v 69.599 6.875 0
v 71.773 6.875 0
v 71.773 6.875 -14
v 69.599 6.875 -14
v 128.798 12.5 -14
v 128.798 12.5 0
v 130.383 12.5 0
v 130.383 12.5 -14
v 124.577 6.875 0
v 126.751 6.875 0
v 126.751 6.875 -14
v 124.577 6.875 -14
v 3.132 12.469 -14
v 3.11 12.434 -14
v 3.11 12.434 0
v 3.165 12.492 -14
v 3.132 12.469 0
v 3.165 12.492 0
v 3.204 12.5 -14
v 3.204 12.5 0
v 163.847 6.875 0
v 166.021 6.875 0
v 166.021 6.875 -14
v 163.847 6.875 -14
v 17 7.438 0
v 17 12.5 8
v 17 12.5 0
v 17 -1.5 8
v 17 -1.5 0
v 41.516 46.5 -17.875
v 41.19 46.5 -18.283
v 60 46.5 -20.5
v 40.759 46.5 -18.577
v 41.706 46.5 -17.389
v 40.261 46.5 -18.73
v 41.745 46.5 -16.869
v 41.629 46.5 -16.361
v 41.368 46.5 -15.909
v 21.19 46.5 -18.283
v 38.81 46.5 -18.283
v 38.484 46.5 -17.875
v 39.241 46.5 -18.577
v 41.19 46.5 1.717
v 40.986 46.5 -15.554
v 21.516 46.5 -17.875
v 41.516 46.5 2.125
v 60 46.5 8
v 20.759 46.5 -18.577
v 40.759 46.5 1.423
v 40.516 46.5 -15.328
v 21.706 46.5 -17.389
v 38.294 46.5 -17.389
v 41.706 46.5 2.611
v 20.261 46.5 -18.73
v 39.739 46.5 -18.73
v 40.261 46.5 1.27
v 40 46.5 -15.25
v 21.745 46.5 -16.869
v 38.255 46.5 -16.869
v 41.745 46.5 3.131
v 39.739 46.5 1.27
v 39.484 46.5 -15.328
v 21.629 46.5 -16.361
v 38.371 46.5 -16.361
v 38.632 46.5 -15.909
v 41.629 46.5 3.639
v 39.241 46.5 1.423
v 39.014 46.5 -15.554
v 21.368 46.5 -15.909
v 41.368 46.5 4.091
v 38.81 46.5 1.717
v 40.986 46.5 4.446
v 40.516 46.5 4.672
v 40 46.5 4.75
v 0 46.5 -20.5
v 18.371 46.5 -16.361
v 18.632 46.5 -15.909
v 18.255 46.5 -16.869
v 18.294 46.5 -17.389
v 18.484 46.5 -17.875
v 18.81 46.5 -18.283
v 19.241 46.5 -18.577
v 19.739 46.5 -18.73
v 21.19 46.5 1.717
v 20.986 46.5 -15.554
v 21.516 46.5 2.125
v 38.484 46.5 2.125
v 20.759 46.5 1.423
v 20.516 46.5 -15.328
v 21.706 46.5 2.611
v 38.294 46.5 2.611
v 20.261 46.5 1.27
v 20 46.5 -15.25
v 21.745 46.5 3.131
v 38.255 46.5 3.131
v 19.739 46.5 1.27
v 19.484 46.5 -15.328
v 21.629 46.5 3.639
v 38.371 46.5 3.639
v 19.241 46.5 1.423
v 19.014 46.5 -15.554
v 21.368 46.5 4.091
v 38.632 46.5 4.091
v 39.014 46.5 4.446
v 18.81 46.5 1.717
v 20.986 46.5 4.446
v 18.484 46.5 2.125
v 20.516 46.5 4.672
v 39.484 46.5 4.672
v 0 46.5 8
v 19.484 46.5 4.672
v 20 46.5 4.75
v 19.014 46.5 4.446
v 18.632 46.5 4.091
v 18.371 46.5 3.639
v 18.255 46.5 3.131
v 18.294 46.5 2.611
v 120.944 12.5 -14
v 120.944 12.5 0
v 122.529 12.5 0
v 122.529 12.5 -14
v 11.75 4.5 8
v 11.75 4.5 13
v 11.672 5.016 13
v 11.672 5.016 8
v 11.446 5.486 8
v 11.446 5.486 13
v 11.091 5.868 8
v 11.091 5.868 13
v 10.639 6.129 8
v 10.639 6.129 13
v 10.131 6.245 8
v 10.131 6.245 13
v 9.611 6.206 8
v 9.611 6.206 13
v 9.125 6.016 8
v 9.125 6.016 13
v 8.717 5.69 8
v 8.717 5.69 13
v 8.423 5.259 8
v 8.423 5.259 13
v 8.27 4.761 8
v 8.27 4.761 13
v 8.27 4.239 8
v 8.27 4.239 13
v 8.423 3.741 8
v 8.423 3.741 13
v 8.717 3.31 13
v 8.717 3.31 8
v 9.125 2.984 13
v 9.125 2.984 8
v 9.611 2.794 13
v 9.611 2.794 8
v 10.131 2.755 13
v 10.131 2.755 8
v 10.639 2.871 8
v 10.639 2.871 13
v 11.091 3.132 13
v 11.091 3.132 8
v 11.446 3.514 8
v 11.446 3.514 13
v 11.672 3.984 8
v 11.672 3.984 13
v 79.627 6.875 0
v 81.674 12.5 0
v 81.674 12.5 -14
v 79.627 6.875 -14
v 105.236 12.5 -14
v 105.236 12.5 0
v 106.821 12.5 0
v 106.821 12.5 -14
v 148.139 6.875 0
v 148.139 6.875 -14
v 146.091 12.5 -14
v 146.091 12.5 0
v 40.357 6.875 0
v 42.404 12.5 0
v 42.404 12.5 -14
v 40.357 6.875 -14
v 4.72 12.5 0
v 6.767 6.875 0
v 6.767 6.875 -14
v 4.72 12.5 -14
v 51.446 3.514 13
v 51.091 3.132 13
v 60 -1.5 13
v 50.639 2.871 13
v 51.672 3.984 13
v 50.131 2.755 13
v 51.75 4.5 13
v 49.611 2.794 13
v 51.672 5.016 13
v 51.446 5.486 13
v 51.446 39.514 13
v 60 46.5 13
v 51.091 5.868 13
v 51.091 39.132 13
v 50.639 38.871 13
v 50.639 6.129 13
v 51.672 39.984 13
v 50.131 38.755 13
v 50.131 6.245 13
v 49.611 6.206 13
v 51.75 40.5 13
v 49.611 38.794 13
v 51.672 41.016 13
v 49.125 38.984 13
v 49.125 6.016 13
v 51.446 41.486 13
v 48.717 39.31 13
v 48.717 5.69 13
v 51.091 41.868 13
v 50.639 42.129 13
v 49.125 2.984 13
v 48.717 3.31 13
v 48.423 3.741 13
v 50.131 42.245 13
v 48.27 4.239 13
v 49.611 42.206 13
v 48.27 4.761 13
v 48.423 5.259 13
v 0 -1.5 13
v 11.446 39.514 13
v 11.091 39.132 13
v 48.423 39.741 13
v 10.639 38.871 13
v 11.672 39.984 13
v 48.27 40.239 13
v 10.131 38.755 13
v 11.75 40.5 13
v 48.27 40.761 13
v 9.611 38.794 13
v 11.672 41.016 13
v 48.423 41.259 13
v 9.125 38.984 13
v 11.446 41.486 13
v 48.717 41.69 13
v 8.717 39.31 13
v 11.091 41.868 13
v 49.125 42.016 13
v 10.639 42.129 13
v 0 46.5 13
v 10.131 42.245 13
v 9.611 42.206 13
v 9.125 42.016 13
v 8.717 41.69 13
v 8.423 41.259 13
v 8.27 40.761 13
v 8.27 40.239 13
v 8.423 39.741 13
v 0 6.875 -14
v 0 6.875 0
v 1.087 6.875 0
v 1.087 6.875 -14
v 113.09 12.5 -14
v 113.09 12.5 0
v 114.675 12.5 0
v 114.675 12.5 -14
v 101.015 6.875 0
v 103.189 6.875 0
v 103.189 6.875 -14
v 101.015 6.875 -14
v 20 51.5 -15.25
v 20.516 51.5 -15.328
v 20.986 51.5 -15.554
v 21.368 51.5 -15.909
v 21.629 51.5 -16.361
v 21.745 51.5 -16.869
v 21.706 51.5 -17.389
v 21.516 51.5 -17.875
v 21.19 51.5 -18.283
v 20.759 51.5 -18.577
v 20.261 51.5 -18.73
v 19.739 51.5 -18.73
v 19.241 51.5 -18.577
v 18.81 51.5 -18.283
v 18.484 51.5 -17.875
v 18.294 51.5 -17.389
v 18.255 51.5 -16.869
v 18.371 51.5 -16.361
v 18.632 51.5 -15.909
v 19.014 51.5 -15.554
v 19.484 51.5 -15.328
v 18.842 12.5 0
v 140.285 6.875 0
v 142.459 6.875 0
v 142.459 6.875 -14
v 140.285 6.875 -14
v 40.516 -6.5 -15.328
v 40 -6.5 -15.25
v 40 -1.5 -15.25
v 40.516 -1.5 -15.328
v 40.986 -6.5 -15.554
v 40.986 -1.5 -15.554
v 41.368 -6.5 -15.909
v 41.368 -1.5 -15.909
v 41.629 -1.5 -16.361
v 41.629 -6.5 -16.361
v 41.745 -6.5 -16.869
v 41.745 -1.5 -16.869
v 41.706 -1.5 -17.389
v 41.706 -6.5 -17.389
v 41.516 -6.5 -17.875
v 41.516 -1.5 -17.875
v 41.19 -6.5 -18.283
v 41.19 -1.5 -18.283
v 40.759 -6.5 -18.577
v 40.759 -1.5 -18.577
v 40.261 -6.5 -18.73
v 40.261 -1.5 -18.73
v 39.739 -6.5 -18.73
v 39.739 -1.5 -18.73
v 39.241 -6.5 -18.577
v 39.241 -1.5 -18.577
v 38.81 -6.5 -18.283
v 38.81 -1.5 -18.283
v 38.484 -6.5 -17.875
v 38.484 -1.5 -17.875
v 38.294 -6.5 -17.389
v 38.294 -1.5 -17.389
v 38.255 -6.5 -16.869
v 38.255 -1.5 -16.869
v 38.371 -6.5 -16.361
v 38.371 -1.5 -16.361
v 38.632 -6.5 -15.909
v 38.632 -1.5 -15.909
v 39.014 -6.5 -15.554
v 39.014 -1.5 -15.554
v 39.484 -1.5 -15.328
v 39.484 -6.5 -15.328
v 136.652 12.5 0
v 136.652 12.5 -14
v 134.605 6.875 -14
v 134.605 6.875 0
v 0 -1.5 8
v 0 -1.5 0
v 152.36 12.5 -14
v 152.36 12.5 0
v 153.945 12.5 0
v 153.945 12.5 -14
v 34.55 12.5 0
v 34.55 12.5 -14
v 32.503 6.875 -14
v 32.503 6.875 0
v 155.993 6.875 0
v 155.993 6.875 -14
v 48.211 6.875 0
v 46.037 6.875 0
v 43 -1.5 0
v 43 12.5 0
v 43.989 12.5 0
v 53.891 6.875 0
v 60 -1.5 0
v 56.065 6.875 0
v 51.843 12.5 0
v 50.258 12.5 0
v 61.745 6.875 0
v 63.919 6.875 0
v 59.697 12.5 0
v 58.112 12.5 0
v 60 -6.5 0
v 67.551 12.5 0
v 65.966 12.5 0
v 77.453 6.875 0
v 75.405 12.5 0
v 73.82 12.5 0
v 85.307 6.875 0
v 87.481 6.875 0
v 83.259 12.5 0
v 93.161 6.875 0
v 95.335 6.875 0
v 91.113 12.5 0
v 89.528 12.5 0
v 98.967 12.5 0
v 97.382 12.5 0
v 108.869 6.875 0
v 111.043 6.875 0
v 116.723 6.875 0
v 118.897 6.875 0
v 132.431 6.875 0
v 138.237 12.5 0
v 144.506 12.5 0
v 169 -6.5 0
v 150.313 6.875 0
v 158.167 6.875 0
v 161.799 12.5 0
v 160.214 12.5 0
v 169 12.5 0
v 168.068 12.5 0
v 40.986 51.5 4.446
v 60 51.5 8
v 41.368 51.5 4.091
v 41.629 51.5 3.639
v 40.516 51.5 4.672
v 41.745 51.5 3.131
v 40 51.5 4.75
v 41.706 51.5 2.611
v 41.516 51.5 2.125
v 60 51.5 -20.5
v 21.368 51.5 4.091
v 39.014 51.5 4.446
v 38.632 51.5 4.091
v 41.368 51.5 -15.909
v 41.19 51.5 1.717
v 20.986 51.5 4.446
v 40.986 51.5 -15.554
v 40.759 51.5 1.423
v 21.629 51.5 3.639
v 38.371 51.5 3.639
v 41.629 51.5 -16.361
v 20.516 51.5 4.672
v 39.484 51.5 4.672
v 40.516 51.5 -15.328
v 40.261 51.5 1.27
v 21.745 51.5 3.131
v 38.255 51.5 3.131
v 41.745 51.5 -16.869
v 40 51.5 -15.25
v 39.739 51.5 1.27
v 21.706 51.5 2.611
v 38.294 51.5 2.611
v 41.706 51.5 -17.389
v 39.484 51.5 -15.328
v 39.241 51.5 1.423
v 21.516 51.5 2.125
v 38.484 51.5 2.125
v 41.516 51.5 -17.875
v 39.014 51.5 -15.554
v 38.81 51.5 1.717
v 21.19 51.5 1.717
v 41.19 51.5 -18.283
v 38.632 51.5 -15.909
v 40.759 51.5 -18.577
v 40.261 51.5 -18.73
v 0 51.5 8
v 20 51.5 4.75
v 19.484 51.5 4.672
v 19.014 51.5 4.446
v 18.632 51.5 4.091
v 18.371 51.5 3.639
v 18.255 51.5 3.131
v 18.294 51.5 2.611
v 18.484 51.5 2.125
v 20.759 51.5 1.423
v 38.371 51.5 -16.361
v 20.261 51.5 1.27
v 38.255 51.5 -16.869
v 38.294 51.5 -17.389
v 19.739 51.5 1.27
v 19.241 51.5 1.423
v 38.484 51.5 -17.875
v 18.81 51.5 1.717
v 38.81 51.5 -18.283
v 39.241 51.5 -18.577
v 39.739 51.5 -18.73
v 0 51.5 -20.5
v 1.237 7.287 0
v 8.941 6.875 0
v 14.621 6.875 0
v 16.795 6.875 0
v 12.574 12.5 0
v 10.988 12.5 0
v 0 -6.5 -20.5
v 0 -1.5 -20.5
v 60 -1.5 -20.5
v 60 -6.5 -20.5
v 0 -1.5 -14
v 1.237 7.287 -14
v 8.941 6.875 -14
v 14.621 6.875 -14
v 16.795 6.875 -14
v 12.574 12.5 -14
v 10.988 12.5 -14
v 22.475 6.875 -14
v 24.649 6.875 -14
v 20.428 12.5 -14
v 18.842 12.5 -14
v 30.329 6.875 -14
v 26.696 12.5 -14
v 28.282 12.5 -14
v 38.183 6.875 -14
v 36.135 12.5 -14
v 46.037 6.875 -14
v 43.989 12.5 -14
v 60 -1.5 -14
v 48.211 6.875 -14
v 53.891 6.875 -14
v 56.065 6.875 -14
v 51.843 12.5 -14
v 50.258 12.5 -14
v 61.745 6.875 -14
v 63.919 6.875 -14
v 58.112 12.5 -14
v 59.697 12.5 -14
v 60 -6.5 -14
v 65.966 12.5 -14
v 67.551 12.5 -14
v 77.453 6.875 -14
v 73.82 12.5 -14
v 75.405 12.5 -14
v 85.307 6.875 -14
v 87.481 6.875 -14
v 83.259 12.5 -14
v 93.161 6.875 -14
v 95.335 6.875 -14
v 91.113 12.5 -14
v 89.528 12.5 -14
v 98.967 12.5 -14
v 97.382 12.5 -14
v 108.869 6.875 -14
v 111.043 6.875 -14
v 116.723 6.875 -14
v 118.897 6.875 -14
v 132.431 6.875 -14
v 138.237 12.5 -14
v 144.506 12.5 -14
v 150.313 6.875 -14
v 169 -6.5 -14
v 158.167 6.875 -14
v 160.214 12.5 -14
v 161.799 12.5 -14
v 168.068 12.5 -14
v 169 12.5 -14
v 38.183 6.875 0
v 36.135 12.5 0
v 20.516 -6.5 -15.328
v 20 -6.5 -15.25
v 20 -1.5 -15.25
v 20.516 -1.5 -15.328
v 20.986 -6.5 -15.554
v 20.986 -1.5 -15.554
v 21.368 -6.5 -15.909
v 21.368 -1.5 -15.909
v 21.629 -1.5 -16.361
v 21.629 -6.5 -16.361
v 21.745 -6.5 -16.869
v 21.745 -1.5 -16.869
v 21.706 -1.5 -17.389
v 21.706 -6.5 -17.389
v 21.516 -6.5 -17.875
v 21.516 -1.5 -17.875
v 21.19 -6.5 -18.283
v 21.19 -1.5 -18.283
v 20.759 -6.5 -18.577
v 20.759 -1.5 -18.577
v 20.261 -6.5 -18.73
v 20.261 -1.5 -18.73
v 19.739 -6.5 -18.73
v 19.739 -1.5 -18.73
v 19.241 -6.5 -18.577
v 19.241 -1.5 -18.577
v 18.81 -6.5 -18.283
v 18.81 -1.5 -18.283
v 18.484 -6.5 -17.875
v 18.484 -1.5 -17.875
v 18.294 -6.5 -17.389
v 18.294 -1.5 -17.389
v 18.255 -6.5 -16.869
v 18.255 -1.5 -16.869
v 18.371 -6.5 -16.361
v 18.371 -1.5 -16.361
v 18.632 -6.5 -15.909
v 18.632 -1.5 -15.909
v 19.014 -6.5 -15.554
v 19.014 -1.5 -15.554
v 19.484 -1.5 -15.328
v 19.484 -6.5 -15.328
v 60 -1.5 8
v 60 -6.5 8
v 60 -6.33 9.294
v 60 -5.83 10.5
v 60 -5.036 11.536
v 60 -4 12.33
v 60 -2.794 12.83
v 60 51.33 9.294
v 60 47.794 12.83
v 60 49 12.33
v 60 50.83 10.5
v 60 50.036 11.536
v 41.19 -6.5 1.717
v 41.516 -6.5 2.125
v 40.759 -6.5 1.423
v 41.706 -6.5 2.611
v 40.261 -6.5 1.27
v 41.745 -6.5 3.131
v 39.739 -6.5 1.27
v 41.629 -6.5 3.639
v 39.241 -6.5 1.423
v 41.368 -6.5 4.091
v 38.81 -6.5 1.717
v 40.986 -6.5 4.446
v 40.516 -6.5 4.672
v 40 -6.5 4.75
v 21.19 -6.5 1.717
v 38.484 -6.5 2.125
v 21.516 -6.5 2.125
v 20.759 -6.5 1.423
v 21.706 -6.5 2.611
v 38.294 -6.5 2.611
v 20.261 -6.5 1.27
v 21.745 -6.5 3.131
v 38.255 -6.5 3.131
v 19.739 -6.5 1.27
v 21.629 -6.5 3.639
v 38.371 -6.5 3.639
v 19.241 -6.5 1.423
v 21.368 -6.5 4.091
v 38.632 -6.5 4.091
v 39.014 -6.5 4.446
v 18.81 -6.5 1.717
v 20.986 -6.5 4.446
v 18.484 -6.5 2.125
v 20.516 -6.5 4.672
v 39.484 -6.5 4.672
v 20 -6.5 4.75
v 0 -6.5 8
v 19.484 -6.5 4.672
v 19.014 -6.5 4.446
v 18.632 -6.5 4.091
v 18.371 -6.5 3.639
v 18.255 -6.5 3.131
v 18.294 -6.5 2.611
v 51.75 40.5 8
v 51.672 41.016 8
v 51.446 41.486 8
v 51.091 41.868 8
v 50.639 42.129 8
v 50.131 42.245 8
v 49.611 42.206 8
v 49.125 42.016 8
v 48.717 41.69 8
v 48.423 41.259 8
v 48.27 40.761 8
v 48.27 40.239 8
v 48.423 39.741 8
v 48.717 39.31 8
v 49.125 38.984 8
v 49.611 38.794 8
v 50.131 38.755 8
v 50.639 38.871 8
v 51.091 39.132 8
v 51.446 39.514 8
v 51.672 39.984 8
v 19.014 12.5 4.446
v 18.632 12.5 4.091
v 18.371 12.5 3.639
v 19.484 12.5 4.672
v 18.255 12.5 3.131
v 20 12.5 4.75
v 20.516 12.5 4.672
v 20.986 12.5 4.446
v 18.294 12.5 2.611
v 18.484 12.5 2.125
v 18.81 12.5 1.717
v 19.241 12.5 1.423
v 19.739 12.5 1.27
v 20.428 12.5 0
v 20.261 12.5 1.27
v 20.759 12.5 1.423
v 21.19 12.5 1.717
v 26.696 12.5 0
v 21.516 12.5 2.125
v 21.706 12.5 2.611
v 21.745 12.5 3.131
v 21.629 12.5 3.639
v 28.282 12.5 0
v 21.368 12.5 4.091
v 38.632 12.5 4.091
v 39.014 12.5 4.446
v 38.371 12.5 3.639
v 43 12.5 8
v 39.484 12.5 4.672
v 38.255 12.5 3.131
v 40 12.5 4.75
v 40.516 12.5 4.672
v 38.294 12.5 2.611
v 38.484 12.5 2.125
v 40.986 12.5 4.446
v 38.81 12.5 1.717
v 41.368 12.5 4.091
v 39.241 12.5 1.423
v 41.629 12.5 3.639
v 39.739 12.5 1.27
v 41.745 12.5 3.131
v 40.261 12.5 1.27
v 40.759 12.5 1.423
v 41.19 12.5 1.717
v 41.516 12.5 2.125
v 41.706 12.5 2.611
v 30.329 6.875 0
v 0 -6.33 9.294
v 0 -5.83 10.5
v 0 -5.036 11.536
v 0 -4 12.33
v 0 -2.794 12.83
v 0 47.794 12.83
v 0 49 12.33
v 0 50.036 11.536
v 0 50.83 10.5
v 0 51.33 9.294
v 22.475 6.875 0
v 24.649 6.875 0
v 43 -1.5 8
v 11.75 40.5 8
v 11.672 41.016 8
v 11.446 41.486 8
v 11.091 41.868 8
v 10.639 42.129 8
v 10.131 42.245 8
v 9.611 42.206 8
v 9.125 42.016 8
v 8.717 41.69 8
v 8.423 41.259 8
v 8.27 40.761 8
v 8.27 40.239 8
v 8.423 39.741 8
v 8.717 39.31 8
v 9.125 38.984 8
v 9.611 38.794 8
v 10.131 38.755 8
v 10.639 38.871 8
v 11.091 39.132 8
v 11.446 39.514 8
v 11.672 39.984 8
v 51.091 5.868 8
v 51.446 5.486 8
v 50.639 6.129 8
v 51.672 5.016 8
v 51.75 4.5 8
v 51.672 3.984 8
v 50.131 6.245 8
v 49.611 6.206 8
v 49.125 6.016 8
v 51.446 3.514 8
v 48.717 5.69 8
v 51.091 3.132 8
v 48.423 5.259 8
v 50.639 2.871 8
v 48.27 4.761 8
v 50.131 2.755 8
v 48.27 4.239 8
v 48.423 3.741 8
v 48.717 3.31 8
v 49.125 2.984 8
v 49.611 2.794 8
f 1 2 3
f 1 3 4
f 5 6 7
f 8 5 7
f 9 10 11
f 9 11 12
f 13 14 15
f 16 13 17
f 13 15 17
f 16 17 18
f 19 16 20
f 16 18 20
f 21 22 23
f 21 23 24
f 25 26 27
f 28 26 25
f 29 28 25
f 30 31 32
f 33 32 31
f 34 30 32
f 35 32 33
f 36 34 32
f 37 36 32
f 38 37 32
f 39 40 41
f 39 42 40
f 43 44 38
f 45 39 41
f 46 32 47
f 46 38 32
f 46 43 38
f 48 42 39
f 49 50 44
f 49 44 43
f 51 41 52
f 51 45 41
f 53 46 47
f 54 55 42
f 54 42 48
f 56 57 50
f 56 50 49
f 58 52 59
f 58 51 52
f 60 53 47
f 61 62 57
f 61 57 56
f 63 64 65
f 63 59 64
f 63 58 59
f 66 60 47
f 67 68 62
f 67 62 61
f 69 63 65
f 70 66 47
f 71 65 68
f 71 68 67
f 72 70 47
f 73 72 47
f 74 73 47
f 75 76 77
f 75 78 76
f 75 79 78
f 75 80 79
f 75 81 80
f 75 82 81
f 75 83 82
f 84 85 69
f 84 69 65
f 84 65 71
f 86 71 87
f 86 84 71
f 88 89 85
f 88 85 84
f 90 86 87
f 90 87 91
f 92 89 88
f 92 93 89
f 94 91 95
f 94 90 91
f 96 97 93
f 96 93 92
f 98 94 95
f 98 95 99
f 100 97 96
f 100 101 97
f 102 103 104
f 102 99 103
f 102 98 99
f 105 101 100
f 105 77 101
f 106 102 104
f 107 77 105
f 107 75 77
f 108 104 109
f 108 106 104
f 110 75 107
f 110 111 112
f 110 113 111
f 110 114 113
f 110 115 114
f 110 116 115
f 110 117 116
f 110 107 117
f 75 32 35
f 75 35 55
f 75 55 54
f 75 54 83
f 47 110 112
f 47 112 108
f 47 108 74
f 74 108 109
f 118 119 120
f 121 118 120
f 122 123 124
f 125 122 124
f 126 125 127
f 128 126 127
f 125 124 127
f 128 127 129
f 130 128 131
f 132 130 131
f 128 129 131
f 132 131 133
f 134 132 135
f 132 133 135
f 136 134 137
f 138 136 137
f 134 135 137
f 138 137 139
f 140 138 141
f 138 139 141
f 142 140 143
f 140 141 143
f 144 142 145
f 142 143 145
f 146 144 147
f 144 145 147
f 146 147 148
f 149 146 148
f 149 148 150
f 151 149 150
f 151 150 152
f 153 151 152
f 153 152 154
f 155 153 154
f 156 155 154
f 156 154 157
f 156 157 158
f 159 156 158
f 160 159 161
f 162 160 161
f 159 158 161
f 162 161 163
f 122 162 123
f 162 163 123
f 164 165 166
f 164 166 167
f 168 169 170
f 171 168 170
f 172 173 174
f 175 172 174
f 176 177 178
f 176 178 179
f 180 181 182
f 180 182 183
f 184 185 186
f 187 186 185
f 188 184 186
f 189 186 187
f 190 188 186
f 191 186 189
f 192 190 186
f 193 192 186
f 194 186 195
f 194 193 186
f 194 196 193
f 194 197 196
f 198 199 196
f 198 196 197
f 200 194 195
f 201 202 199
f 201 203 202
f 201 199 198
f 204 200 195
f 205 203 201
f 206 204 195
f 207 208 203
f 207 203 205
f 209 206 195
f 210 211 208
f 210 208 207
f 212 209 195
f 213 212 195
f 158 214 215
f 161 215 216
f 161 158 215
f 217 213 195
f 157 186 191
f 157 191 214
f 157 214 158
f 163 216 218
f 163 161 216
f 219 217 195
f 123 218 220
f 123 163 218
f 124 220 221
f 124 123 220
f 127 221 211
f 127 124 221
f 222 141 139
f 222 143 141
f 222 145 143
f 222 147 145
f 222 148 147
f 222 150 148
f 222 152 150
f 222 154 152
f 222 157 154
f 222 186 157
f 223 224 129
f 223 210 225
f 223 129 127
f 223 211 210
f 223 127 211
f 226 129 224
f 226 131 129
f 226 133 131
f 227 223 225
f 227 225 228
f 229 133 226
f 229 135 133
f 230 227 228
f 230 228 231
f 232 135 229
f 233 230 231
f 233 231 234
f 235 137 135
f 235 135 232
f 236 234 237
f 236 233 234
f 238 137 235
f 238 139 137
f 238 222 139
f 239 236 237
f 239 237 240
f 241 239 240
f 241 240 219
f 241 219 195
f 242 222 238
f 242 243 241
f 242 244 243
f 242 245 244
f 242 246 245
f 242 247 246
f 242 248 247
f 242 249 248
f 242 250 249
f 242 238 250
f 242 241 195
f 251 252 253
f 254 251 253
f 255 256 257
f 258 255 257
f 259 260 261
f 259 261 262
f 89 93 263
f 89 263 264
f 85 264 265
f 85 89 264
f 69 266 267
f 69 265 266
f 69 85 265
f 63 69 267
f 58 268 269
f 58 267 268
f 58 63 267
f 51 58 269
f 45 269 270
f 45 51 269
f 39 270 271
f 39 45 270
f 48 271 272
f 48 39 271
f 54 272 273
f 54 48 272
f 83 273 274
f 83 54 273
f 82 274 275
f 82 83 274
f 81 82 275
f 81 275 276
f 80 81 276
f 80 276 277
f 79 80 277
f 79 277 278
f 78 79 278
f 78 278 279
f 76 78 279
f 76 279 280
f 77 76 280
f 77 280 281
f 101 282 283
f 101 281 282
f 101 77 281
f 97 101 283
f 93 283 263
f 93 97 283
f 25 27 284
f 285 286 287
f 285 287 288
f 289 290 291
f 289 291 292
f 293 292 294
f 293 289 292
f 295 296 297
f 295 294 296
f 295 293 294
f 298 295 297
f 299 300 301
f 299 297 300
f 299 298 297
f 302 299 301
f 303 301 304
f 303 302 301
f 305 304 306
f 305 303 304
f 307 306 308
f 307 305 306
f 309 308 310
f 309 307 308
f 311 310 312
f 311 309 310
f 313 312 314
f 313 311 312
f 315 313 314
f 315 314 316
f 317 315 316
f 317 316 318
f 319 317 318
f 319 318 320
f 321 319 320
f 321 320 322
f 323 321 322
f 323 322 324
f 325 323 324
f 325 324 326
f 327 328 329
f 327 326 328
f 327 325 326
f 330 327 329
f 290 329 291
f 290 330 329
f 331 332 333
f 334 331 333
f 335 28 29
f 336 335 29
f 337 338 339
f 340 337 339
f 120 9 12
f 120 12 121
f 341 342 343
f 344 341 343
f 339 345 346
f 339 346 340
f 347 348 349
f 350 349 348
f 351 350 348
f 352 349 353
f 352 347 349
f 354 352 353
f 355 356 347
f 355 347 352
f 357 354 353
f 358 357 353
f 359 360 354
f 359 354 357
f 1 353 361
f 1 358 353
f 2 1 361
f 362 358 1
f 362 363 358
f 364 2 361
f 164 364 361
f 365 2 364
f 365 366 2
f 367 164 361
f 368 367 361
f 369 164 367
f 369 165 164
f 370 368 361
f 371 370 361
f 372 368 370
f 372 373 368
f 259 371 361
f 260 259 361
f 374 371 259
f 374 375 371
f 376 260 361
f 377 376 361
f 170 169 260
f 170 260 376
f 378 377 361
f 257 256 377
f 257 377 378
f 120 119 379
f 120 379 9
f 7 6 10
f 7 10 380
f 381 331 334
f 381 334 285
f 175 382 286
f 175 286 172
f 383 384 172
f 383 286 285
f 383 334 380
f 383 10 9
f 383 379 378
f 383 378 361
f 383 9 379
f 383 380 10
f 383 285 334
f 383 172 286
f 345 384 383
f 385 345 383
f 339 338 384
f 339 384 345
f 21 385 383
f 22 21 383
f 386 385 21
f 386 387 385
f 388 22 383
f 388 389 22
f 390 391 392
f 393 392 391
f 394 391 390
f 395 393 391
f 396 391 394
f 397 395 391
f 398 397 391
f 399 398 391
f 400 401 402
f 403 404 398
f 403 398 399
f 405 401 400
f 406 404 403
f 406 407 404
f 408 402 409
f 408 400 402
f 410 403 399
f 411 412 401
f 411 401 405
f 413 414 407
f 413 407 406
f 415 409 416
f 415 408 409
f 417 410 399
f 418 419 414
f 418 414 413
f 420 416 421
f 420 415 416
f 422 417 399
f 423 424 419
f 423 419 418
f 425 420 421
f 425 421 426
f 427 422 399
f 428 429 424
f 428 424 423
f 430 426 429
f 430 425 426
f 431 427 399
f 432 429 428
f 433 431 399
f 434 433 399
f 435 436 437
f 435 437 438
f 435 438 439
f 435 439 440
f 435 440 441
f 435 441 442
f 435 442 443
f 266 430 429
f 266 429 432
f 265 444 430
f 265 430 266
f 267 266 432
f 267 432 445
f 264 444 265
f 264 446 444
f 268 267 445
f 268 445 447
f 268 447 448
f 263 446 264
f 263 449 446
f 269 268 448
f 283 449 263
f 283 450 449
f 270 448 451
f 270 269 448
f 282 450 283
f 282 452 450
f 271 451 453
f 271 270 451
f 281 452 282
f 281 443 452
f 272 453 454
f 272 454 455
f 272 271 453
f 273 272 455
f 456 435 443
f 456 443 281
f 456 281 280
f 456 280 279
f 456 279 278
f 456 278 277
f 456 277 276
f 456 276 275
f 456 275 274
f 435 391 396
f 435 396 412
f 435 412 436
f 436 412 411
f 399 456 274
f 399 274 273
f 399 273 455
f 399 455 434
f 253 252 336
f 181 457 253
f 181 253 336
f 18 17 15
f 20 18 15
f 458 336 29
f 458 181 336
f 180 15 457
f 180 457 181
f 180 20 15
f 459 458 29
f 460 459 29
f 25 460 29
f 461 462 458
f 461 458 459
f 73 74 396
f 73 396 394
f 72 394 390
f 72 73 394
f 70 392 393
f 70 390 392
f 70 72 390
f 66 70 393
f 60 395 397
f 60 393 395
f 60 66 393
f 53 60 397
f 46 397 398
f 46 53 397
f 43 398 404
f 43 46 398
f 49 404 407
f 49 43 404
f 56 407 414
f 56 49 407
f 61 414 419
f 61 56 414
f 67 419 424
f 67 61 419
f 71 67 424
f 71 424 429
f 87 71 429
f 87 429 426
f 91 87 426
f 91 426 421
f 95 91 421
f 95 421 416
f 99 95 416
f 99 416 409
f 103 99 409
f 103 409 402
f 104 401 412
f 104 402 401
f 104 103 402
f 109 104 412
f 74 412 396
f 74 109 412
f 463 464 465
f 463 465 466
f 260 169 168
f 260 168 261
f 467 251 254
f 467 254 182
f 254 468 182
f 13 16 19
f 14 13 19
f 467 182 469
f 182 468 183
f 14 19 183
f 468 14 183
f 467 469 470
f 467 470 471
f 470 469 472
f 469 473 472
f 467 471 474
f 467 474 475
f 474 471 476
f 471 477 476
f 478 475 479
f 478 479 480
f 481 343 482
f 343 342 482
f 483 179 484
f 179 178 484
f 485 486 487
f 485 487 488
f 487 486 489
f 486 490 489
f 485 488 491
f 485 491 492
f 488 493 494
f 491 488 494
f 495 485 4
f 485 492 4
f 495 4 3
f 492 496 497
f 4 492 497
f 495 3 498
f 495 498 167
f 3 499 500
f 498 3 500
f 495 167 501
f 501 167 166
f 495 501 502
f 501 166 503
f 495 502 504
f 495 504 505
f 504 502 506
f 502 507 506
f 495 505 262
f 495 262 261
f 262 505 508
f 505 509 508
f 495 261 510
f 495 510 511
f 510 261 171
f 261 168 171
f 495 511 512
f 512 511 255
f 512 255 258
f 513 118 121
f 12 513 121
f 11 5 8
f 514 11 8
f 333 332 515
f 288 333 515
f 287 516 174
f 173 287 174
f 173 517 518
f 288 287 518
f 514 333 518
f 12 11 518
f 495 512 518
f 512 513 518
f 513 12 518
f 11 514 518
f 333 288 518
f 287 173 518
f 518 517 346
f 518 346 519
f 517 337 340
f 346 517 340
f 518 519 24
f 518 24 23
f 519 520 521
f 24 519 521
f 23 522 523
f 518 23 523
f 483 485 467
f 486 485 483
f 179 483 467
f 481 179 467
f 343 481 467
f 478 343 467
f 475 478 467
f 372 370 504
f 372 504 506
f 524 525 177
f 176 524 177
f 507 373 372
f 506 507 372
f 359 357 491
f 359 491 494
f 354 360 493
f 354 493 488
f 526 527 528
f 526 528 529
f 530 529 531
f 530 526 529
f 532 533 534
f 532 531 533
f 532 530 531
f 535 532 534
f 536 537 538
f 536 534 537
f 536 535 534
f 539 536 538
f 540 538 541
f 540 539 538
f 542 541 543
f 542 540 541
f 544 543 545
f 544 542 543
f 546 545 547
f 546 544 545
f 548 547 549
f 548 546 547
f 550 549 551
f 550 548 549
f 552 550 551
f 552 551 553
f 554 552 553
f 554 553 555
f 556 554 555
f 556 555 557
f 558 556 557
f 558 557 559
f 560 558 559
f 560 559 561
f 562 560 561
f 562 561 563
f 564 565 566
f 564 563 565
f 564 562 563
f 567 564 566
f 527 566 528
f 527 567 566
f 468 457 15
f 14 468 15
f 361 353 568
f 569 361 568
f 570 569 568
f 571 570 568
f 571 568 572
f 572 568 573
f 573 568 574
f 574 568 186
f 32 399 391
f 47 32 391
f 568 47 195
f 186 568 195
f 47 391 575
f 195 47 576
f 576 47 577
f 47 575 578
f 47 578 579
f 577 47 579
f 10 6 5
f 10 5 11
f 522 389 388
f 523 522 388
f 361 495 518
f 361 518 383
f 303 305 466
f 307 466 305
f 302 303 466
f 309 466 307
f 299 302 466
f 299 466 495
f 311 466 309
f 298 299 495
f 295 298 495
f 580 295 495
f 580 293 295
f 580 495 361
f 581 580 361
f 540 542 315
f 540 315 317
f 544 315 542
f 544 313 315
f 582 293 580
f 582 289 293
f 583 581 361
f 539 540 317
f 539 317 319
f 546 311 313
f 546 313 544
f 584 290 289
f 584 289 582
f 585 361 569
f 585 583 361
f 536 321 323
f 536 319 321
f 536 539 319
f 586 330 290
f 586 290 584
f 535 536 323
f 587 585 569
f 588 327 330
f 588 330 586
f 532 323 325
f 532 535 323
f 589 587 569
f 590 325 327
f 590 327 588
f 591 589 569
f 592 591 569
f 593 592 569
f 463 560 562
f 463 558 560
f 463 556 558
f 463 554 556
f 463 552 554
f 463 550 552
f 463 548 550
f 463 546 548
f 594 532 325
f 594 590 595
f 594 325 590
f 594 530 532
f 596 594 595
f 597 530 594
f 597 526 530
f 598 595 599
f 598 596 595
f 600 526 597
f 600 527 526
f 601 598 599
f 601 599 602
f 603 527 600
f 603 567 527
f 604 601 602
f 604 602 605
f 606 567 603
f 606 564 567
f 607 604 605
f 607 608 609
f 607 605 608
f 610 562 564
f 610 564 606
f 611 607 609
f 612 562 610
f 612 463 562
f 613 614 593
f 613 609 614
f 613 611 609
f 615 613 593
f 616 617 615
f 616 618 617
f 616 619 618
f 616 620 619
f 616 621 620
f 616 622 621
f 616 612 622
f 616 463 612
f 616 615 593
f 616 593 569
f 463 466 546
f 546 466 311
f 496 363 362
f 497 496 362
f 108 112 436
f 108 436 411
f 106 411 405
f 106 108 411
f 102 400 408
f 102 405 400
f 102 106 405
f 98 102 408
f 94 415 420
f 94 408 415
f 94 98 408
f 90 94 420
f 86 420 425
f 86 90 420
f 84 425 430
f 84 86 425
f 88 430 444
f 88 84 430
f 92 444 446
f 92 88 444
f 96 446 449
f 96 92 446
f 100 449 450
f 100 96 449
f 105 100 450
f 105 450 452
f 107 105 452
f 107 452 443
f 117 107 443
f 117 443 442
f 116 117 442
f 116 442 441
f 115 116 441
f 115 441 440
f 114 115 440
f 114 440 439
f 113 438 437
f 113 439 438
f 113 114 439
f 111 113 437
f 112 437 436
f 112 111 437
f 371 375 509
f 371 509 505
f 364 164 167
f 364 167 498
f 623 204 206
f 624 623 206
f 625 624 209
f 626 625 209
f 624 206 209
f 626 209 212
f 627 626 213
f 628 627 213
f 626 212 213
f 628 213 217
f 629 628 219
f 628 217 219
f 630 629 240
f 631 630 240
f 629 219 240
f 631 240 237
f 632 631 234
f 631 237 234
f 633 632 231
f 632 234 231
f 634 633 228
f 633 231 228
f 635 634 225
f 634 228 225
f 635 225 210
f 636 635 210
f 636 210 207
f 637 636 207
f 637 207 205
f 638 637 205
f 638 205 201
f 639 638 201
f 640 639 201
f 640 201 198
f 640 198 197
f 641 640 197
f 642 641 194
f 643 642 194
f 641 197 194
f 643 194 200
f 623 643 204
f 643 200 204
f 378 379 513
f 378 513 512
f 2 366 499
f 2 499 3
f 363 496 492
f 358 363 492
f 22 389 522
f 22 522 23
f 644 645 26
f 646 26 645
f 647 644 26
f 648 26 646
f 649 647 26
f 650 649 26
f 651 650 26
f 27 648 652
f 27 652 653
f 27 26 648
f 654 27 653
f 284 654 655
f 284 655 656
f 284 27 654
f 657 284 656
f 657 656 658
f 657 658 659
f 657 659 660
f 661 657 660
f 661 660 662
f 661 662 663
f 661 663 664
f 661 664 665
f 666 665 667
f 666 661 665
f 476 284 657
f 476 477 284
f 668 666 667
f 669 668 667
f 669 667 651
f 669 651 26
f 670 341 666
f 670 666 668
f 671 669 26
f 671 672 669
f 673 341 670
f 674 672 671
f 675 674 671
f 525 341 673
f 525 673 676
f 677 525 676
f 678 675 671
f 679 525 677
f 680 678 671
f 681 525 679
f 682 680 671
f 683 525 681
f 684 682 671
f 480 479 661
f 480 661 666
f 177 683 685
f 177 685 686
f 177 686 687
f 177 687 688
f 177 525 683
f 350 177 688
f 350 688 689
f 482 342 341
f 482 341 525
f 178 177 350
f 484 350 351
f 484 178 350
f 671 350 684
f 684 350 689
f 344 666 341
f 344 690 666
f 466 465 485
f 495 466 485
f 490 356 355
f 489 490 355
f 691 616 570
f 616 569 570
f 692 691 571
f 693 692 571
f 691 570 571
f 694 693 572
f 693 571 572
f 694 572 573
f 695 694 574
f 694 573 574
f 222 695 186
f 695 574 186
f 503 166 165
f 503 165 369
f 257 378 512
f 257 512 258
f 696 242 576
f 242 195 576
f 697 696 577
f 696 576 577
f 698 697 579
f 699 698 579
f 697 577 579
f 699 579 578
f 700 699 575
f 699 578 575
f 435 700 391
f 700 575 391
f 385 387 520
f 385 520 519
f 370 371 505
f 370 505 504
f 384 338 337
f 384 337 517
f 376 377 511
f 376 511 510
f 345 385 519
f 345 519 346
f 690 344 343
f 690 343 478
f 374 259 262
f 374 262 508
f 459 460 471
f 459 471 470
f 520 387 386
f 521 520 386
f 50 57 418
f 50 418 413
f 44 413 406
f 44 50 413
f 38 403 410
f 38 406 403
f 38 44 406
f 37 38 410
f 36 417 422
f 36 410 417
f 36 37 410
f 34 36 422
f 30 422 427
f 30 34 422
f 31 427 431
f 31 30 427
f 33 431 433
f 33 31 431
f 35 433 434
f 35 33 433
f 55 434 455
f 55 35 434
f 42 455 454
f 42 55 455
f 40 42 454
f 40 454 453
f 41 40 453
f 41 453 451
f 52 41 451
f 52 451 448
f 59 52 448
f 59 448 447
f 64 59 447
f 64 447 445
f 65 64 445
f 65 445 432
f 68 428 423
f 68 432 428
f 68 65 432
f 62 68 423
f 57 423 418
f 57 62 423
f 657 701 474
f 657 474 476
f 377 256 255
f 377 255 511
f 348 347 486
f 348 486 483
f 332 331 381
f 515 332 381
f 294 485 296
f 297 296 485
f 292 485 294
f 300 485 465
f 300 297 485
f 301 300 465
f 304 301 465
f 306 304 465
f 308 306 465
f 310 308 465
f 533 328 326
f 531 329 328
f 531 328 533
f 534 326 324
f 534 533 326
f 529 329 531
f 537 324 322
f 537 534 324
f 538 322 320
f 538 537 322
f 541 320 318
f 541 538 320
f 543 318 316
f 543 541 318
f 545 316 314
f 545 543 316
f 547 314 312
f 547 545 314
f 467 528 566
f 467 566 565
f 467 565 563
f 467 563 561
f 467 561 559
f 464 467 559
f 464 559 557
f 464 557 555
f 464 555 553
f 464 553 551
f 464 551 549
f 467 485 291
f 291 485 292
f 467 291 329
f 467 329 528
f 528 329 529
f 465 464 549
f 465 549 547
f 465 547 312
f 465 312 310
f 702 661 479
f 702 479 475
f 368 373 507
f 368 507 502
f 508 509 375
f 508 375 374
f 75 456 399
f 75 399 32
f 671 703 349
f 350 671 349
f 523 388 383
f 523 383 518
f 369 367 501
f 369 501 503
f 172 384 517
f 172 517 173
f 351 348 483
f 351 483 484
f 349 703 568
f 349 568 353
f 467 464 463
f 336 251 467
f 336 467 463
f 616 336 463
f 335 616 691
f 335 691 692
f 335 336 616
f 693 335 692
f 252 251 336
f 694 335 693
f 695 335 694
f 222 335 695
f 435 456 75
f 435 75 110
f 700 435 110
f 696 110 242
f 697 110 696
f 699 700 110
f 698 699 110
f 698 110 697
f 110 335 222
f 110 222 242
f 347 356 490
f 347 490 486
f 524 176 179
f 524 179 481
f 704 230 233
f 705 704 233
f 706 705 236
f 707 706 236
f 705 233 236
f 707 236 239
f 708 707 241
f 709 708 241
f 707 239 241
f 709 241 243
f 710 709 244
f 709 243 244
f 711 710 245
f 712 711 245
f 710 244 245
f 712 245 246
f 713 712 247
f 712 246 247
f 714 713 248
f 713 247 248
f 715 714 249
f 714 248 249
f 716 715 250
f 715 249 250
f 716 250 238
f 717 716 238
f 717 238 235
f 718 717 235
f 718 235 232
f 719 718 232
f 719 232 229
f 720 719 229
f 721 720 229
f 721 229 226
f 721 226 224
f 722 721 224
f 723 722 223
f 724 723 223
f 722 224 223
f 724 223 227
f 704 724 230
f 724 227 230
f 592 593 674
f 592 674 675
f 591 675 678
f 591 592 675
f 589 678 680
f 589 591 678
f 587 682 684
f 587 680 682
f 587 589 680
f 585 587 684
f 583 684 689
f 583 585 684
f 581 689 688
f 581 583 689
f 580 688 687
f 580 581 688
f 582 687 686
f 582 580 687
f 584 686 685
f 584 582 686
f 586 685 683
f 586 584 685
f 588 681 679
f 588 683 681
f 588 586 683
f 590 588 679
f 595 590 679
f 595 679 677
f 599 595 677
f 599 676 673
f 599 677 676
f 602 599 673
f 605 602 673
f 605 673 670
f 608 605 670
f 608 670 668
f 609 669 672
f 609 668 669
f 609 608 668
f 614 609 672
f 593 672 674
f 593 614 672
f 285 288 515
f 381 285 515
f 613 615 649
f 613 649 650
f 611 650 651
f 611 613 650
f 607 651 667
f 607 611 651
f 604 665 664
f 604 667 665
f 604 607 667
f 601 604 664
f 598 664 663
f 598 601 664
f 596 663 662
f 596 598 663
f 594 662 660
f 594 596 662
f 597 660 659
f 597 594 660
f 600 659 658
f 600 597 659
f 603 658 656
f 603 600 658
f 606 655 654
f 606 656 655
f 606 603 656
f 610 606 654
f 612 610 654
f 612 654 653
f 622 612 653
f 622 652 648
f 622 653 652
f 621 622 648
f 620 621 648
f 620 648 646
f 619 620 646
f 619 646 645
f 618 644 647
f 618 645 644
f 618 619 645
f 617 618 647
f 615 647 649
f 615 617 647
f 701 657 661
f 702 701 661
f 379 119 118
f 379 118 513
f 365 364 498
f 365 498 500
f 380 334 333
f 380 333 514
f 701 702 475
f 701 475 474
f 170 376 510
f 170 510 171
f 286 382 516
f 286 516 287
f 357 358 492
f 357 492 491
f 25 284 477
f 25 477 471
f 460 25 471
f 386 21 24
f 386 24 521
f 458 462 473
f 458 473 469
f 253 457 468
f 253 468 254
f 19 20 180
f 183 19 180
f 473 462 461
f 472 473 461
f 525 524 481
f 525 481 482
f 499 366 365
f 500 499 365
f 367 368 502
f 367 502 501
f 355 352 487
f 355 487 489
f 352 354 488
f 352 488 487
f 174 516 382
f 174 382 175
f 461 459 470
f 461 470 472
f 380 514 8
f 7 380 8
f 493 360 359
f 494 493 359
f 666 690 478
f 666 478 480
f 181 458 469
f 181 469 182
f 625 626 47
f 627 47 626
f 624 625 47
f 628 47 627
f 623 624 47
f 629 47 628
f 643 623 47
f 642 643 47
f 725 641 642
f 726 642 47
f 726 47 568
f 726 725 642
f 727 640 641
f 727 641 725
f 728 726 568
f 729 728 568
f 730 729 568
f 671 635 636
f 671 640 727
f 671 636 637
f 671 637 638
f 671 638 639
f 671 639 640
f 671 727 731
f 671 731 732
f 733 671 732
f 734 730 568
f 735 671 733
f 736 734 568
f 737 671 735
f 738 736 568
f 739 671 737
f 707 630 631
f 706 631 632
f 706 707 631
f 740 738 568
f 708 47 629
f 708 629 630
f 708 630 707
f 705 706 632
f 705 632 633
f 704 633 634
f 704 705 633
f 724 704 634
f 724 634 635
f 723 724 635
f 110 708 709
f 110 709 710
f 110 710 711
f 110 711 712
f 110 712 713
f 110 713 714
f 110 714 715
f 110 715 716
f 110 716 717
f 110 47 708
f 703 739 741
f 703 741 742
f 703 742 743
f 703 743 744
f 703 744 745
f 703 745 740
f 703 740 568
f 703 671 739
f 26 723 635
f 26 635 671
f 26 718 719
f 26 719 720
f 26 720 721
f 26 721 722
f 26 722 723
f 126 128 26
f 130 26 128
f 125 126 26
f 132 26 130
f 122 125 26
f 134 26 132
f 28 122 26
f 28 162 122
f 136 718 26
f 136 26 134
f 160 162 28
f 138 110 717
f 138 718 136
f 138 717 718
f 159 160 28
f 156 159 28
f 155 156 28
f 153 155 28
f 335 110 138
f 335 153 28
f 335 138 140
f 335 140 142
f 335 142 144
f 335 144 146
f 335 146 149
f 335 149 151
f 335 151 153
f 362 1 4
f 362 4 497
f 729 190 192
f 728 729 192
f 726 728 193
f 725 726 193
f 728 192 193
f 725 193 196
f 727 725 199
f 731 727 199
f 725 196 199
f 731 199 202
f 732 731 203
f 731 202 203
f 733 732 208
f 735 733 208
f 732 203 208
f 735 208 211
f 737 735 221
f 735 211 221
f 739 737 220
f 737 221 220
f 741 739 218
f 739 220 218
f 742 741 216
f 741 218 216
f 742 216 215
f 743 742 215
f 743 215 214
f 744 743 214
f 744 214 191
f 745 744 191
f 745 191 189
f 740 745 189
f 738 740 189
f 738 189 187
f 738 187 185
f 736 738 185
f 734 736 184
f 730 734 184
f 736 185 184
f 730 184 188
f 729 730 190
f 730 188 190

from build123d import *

# Parameters (mm, degrees)
BLANKSKE_W              = 209
BLANKSKE_H              = 12.5
BLANK_DEPTH             = 14
TOOTHCUTILL_DEPTH       = 210.841011244
TOOTHCUTSIM_DEPTH       = 210.841011244
TEETHCUTS_COUNT         = 27
TEETHCUTS_PITCH         = 7.853981625
SKETCH8_W               = 209
SKETCH8_H               = 14
BOSS_EXTRUDE3_DEPTH     = 6.5
BOSS_EXTRUDE1_START     = -209
BOSS_EXTRUDE1_DEPTH     = 60
SKETCH4_R               = 1.75
CUT_EXTRUDE1_DEPTH      = 5
BOSS_EXTRUDE2_REACH     = 218.588
SKETCH6_W               = 26
SKETCH6_H               = 8
CUT_EXTRUDE2_DEPTH      = 214.593656273
CUT_EXTRUDE2_DEPTH_BACK = 214.593656273
SKETCH7_R               = 1.75
FILLET1_R               = 5
SKETCH9_W               = 14
SKETCH9_H               = 19
CUT_EXTRUDE3_DEPTH      = 40


with BuildPart() as part:
    # BlankSke → Blank (new body)
    with BuildSketch(Plane.XY):
        with Locations((104.5, 6.25)):
            Rectangle(BLANKSKE_W, BLANKSKE_H)
    extrude(amount=-BLANK_DEPTH)

    # TooCutSkeIll → ToothCutIll (cut, through all)
    with BuildSketch(Plane.XY):
        with BuildLine():
            Line((-3.110472484, 12.434202014), (-1.237006086, 7.28689539))
            ThreePointArc((-1.237006086, 7.28689539), (-1.007817354, 6.98821082), (-0.648758505, 6.875))
            Line((-0.648758505, 6.875), (0.648758505, 6.875))
            ThreePointArc((0.648758505, 6.875), (1.007817354, 6.98821082), (1.237006086, 7.28689539))
            Line((1.237006086, 7.28689539), (3.110472484, 12.434202014))
            ThreePointArc((3.110472484, 12.434202014), (3.147084102, 12.481915204), (3.204441746, 12.5))
            Line((3.204441746, 12.5), (3.204441746, 12.5254))
            Line((3.204441746, 12.5254), (-3.204441746, 12.5254))
            Line((-3.204441746, 12.5254), (-3.204441746, 12.5))
            ThreePointArc((-3.204441746, 12.5), (-3.147084102, 12.481915204), (-3.110472484, 12.434202014))
        make_face()
    extrude(amount=-TOOTHCUTILL_DEPTH, mode=Mode.SUBTRACT)

    # TooCutSkeSim → ToothCutSim (cut, through all)
    with BuildSketch(Plane.XY):
        Polygon((1.087088424, 6.875), (-1.087088424, 6.875), (-3.143665836, 12.5254), (3.143665836, 12.5254), align=None)
    toothcutsim = extrude(amount=-TOOTHCUTSIM_DEPTH, mode=Mode.SUBTRACT)

    # TeethCuts: ToothCutSim ×27
    with Locations(*[(i * TEETHCUTS_PITCH, 0, 0) for i in range(1, TEETHCUTS_COUNT)]):
        add(toothcutsim, mode=Mode.SUBTRACT)

    # Sketch8 → Boss-Extrude3 (add)
    with BuildSketch(Plane.XZ):
        with Locations((104.5, -7)):
            Rectangle(SKETCH8_W, SKETCH8_H)
    extrude(amount=BOSS_EXTRUDE3_DEPTH)

    # Sketch3 → Boss-Extrude1 (add)
    with BuildSketch(Plane(origin=(209, 0, 0), x_dir=(0, 0, -1), z_dir=(1, 0, 0)).offset(BOSS_EXTRUDE1_START)):
        Polygon((20.5, -6.5), (-13, -6.5), (-13, 51.5), (20.5, 51.5), (20.5, 46.5), (-8, 46.5), (-8, -1.5), (20.5, -1.5), align=None)
    extrude(amount=BOSS_EXTRUDE1_DEPTH)

    # Sketch4 → Cut-Extrude1 (cut)
    with BuildSketch(Plane.XY.offset(13)):
        with Locations((10, 40.5)):
            Circle(SKETCH4_R)
        with Locations((50, 40.5)):
            Circle(SKETCH4_R)
        with Locations((50, 4.5)):
            Circle(SKETCH4_R)
        with Locations((10, 4.5)):
            Circle(SKETCH4_R)
    extrude(amount=-CUT_EXTRUDE1_DEPTH, mode=Mode.SUBTRACT)

    # Boss-Extrude2: up to this face of the body (flat: up to its plane)
    boss_extrude2_end = Plane(part.part.faces().sort_by_distance((19.634954063, 12.5, -7))[0])
    # Sketch6 → Boss-Extrude2 (add, up to the picked face)
    with BuildSketch(Plane(origin=(0, -1.5, 0), x_dir=(1, 0, 0), z_dir=(0, 1, 0)), mode=Mode.PRIVATE) as boss_extrude2_sk1:
        with Locations((30, -4)):
            Rectangle(SKETCH6_W, SKETCH6_H)
    boss_extrude2_tool1 = split(extrude(boss_extrude2_sk1.sketch, amount=BOSS_EXTRUDE2_REACH, mode=Mode.PRIVATE), bisect_by=boss_extrude2_end, keep=Keep.BOTH, mode=Mode.PRIVATE)
    add(boss_extrude2_tool1.solids().sort_by(Axis((30, -1.5, 4), (0, 1, 0)))[0])

    # Sketch7 → Cut-Extrude2 (cut, two sides: drawn at the far end of the back side and taken through both)
    with BuildSketch(Plane(origin=(0, 12.5, 0), x_dir=(1, 0, 0), z_dir=(0, 1, 0)).offset(-CUT_EXTRUDE2_DEPTH_BACK)):
        with Locations(Location((20, 17, 0), (0, 0, 270))):
            Circle(SKETCH7_R)
        with Locations(Location((40, 17, 0), (0, 0, 270))):
            Circle(SKETCH7_R)
        with Locations(Location((40, -3, 0), (0, 0, 270))):
            Circle(SKETCH7_R)
        with Locations(Location((20, -3, 0), (0, 0, 270))):
            Circle(SKETCH7_R)
    extrude(amount=CUT_EXTRUDE2_DEPTH + CUT_EXTRUDE2_DEPTH_BACK, mode=Mode.SUBTRACT)

    # Fillet1
    fillet1_edges = [part.edges().sort_by_distance(p)[0] for p in [
        (30, -6.5, 13),
        (30, 51.5, 13),
    ]]
    fillet(fillet1_edges, radius=FILLET1_R)

    # Sketch9 → Cut-Extrude3 (cut)
    with BuildSketch(Plane(origin=(209, 0, 0), x_dir=(0, 0, -1), z_dir=(1, 0, 0))):
        with Locations((7, 3)):
            Rectangle(SKETCH9_W, SKETCH9_H)
    extrude(amount=-CUT_EXTRUDE3_DEPTH, mode=Mode.SUBTRACT)


solid = part.part
